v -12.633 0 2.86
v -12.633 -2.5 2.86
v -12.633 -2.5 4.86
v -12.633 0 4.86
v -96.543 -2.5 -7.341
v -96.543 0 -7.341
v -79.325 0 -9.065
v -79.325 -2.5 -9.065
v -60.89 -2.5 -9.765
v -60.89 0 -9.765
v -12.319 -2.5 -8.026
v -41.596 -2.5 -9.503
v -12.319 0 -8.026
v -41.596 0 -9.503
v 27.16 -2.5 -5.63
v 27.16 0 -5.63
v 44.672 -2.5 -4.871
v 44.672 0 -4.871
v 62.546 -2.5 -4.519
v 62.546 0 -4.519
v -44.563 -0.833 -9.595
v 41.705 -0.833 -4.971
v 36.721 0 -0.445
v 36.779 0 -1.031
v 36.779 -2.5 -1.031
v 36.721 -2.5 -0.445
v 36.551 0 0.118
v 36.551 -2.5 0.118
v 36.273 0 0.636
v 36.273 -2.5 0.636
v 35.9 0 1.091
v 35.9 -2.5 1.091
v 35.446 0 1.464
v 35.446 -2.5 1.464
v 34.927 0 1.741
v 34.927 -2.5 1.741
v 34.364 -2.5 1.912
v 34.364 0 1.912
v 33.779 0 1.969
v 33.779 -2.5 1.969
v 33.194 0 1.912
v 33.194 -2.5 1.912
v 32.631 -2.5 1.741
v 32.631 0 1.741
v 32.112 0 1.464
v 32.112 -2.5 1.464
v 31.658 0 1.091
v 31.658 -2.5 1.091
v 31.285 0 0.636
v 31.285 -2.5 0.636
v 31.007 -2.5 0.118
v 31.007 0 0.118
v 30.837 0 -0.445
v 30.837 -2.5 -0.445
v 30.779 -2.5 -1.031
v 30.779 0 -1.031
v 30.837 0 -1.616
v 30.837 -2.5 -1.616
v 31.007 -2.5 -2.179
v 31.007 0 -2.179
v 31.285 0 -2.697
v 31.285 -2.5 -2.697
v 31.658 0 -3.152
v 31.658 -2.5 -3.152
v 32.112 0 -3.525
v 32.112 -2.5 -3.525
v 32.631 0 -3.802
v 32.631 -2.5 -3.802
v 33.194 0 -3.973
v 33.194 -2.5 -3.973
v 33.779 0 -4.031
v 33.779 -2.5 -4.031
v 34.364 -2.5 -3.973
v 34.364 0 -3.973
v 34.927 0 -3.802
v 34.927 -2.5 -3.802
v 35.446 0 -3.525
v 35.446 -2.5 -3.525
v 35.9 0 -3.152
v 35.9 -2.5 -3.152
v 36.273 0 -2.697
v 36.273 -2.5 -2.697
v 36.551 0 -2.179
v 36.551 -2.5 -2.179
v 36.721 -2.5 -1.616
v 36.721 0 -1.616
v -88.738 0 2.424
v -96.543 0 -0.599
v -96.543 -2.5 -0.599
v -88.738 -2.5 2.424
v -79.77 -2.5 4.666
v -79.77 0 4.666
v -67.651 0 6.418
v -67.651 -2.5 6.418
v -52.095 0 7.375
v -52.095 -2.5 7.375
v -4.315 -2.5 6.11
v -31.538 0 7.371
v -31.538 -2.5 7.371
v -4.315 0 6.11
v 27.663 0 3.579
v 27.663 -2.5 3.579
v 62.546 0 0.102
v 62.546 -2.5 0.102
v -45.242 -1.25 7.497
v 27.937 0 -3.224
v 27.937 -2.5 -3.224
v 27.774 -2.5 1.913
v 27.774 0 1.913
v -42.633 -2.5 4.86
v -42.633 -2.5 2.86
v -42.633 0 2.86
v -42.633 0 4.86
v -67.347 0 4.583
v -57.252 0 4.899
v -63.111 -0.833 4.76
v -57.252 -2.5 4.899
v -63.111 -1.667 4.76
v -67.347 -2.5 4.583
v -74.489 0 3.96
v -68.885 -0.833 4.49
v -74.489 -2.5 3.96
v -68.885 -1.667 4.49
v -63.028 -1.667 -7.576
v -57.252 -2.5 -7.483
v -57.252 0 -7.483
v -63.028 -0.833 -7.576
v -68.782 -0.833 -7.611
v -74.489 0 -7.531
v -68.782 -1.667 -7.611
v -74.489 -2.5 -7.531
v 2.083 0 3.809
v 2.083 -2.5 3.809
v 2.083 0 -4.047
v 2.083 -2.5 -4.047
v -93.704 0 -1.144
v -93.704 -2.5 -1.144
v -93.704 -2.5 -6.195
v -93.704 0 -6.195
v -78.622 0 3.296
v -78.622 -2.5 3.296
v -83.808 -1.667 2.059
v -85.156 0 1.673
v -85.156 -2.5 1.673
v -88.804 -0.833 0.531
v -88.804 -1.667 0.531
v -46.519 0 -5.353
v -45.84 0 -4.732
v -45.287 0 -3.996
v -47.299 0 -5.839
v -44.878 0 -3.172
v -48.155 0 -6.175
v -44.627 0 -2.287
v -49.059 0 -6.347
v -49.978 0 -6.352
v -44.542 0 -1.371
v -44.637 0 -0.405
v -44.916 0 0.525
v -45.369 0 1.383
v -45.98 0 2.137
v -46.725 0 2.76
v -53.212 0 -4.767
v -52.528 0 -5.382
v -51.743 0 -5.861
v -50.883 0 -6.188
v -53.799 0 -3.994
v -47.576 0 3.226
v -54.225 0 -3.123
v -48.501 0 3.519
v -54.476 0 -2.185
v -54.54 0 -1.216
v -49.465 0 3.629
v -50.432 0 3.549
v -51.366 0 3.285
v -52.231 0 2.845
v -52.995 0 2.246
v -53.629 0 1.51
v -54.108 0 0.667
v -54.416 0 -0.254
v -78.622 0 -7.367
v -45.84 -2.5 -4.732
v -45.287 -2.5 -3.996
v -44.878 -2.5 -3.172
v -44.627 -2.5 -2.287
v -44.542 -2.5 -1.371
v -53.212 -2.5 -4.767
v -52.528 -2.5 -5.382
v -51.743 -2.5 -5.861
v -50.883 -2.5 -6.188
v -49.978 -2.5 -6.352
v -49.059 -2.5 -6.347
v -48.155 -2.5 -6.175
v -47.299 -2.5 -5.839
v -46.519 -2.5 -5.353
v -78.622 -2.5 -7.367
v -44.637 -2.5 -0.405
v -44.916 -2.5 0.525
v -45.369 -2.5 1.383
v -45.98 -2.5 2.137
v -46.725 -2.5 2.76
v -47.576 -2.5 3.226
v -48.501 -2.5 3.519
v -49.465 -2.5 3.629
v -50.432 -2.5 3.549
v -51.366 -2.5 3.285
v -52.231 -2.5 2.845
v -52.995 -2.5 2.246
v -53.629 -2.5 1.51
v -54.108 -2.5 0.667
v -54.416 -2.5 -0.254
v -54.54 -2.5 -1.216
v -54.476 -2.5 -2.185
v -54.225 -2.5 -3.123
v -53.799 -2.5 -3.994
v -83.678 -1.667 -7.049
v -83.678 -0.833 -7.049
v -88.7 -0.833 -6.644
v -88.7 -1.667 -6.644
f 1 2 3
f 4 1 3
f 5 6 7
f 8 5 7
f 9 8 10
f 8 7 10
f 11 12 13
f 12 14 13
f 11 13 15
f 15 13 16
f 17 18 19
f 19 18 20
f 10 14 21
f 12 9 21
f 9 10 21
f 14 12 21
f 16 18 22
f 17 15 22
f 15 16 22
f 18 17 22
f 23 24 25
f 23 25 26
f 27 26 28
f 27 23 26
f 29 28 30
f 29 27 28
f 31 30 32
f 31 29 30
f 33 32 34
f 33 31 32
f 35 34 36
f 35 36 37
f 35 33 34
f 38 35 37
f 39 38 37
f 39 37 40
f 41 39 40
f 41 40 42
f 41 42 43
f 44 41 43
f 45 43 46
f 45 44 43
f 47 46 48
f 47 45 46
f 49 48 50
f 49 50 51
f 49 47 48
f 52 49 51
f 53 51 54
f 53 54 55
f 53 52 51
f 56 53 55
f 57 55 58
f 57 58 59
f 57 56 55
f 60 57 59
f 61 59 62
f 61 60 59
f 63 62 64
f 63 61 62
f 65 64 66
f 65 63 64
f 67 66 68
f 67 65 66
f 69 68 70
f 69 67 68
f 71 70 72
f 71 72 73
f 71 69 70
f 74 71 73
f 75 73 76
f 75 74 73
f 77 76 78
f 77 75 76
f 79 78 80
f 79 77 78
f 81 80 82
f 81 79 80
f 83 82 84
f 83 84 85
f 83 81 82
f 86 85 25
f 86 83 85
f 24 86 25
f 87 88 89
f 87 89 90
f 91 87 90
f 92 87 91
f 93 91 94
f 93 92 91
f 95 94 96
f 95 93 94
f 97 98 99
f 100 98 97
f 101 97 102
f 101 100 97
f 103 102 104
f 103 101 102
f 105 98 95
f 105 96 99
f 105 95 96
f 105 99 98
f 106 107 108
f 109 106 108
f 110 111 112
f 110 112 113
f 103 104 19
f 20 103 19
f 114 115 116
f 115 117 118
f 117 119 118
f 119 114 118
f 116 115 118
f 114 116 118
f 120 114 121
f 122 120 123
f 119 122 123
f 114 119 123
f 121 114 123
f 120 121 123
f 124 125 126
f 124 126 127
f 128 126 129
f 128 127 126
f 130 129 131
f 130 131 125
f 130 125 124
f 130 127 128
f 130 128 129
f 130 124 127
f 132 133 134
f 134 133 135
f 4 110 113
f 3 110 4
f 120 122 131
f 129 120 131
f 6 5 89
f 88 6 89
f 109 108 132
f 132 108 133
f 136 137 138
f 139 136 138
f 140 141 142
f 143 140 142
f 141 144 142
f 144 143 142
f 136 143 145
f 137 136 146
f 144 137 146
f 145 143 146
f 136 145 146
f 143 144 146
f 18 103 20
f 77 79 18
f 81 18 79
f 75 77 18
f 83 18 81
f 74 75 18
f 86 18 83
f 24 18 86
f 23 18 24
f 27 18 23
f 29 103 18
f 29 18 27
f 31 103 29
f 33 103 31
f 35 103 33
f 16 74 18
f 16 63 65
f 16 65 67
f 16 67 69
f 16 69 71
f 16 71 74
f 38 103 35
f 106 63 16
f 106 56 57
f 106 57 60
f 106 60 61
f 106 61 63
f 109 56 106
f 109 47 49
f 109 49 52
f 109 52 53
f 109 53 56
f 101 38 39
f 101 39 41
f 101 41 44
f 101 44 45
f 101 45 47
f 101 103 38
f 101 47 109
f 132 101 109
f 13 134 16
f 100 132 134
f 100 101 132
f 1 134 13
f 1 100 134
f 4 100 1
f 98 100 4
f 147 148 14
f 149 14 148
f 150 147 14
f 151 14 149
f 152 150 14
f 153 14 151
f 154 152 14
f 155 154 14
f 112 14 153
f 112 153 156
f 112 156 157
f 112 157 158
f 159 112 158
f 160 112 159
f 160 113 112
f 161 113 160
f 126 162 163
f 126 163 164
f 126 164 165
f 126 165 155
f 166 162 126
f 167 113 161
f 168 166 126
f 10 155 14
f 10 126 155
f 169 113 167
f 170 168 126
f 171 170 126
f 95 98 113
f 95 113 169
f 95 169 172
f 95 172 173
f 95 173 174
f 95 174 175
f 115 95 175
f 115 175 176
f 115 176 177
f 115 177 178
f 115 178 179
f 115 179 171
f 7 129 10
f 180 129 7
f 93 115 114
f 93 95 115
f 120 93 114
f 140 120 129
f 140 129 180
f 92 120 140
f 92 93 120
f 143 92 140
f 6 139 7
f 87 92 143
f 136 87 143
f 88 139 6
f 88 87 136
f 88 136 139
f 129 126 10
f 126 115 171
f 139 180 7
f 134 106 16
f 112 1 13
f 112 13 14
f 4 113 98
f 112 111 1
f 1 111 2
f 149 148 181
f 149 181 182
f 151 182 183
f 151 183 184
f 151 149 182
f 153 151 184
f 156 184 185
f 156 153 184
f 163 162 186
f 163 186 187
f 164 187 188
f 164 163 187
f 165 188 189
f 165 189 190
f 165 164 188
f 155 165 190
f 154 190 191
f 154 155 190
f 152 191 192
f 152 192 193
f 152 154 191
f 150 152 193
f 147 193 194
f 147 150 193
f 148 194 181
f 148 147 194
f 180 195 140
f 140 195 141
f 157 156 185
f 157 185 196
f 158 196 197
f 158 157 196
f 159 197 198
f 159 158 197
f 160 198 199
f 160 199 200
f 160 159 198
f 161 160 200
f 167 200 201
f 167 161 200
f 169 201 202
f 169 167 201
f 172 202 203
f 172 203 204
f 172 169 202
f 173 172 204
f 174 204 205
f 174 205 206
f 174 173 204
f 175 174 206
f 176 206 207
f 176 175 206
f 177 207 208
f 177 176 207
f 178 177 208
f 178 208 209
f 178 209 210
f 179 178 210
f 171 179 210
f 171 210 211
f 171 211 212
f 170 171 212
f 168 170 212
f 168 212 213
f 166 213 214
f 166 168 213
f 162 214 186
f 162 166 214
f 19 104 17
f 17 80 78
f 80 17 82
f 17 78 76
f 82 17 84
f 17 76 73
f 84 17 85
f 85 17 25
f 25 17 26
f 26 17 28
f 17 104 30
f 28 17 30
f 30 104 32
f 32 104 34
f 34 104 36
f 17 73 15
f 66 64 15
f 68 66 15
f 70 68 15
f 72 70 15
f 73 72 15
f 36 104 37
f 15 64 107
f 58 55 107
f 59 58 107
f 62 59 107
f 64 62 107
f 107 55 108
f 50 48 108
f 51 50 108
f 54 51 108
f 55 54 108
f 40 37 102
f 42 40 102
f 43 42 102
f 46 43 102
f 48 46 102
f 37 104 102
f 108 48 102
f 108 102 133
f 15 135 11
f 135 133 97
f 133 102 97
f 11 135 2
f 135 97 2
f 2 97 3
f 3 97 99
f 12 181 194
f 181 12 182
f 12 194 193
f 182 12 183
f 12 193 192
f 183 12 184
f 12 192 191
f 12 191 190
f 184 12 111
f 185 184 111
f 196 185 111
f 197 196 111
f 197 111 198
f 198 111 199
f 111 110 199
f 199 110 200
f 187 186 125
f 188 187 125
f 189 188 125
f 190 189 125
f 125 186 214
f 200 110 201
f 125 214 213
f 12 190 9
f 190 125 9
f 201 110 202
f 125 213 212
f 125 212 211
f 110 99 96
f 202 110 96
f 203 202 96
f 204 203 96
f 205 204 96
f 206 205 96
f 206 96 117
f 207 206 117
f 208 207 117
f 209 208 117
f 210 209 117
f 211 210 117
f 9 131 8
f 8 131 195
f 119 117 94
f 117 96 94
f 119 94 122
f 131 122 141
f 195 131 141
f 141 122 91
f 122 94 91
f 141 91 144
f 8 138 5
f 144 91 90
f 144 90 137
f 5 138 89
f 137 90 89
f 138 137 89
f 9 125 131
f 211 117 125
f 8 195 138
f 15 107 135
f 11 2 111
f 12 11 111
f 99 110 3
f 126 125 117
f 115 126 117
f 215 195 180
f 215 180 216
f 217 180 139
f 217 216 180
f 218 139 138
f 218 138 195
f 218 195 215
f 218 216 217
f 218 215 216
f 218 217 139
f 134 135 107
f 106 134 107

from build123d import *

# Parameters (mm, degrees)
F2_DEPTH = 2.5
F1_R     = 3
F3_DEPTH = 2.5
F5_DEPTH = 2.5
F4_W     = 30
F4_H     = 2
F6_DEPTH = 2.5
F7_DEPTH = 2.5


with BuildPart() as f2:
    # F0 (on Front) → F2 (new body)
    with BuildSketch(Plane.XZ):
        with BuildLine():
            add(Edge.make_bspline(
                [(-96.9805282175, -0.8100506688), (-84.7869920978, 5.1468541776), (-38.6381415733, 10.9636146396), (42.6881882799, 2.4723259958), (100, -4.047003109)],
                knots=[0, 0, 0, 0, 0.374886421, 1, 1, 1, 1], degree=3))
            add(Edge.make_bspline(
                [(-97.5447368223, -7.1186651935), (-99.939251346, -6.5508492693), (-102.885147974, -5.168950634), (-100.0067471137, -2.3789404522), (-96.9805282175, -0.8100506688)],
                knots=[0.0564585679, 0.0564585679, 0.0564585679, 0.0564585679, 0.4847104148, 1, 1, 1, 1], degree=3))
            add(Edge.make_bspline(
                [(-96.5428845142, -7.3406707446), (-96.8949965543, -7.2673488468), (-97.22905608, -7.1935231869), (-97.5447368223, -7.1186651935)],
                knots=[0, 0, 0, 0, 0.0564585679, 0.0564585679, 0.0564585679, 0.0564585679], degree=3))
            add(Edge.make_bspline(
                [(-96.5428845142, -7.3406707446), (-80.7020161693, -9.4302402111), (-44.2471235075, -11.1181020976), (41.8622965332, -3.5518856086), (82.0915186506, -4.6802794425), (100, -4.047003109)],
                knots=[0, 0, 0, 0, 0.2987594418, 0.6837410955, 1, 1, 1, 1], degree=3))
        make_face()
        with BuildLine():
            add(Edge.make_bspline(
                [(-99.8196757147, -4.047003109), (-99.3821638101, -3.2227137691), (-97.9006497107, -2.3042858417), (-96.3385477662, -1.6362179573)],
                knots=[0.5425000514, 0.5425000514, 0.5425000514, 0.5425000514, 1, 1, 1, 1], degree=3))
            add(Edge.make_bspline(
                [(-96.3385477662, -1.6362179573), (-85.7442874691, 3.2900694446), (-38.7960585931, 10.0747672146), (36.943279708, 1.696590452), (86.094097513, -3.3751911245)],
                knots=[0, 0, 0, 0, 0.384923117, 1, 1, 1, 1], degree=3))
            add(Edge.make_bspline(
                [(-97.3825784566, -6.0471531808), (-82.3468325761, -8.841713568), (-44.2551066449, -8.6286827794), (40.9195716837, -3.3120714751), (72.7341022162, -3.1550192186), (86.094097513, -3.3751911245)],
                knots=[0, 0, 0, 0, 0.3131273629, 0.7122131732, 1, 1, 1, 1], degree=3))
            add(Edge.make_bspline(
                [(-97.3825784566, -6.0471531808), (-98.6588937786, -5.8946130057), (-100.1661659123, -5.1778479876), (-99.9138553768, -4.2244412327), (-99.8196757147, -4.047003109)],
                knots=[0, 0, 0, 0, 0.4440177242, 0.5425000514, 0.5425000514, 0.5425000514, 0.5425000514], degree=3))
        make_face(mode=Mode.SUBTRACT)
        with BuildLine():
            add(Edge.make_bspline(
                [(-96.3385477662, -1.6362179573), (-85.7442874691, 3.2900694446), (-38.7960585931, 10.0747672146), (36.943279708, 1.696590452), (86.094097513, -3.3751911245)],
                knots=[0, 0, 0, 0, 0.384923117, 1, 1, 1, 1], degree=3))
            add(Edge.make_bspline(
                [(-99.8196757147, -4.047003109), (-99.3821638101, -3.2227137691), (-97.9006497107, -2.3042858417), (-96.3385477662, -1.6362179573)],
                knots=[0.5425000514, 0.5425000514, 0.5425000514, 0.5425000514, 1, 1, 1, 1], degree=3))
            add(Edge.make_bspline(
                [(-97.3825784566, -6.0471531808), (-98.6588937786, -5.8946130057), (-100.1661659123, -5.1778479876), (-99.9138553768, -4.2244412327), (-99.8196757147, -4.047003109)],
                knots=[0, 0, 0, 0, 0.4440177242, 0.5425000514, 0.5425000514, 0.5425000514, 0.5425000514], degree=3))
            add(Edge.make_bspline(
                [(-97.3825784566, -6.0471531808), (-82.3468325761, -8.841713568), (-44.2551066449, -8.6286827794), (40.9195716837, -3.3120714751), (72.7341022162, -3.1550192186), (86.094097513, -3.3751911245)],
                knots=[0, 0, 0, 0, 0.3131273629, 0.7122131732, 1, 1, 1, 1], degree=3))
        make_face()
        with BuildLine():
            add(Edge.make_bspline(
                [(-96.5428845142, -7.3406707446), (-96.8949965543, -7.2673488468), (-97.22905608, -7.1935231869), (-97.5447368223, -7.1186651935)],
                knots=[0, 0, 0, 0, 0.0564585679, 0.0564585679, 0.0564585679, 0.0564585679], degree=3))
            ThreePointArc((-97.5447368223, -7.1186651935), (-97.052492706, -7.2688477084), (-96.5428845142, -7.3406707446))
        make_face()
    extrude(amount=F2_DEPTH)


with BuildPart() as f2b:
    # F1 (on Front) → F2, piece 2 (new body)
    with BuildSketch(Plane.XZ):
        with Locations((33.7789729238, -1.0305350879)):
            Circle(F1_R)
    extrude(amount=F2_DEPTH)


with BuildPart() as f2c:
    # F1 (on Front) → F2, piece 3 (new body)
    with BuildSketch(Plane.XZ):
        with BuildLine():
            ThreePointArc((-44.542362095, -1.3708024857), (-51.3662704709, 3.2846629299), (-53.2117053896, -4.7672594318))
            Line((-53.2117053896, -4.7672594318), (-45.8404576082, -4.7317403266))
            ThreePointArc((-45.8404576082, -4.7317403266), (-44.8781621403, -3.1722571154), (-44.542362095, -1.3708024857))
        make_face()
        with BuildLine():
            Line((-45.8404576082, -4.7317403266), (-53.2117053896, -4.7672594318))
            ThreePointArc((-53.2117053896, -4.7672594318), (-49.5182693675, -6.3707444394), (-45.8404576082, -4.7317403266))
        make_face()
    extrude(amount=F2_DEPTH)


with BuildPart() as f3_tool:
    # F1 (on Front) → F3 (new body)
    with BuildSketch(Plane.XZ):
        with BuildLine():
            ThreePointArc((-44.542362095, -1.3708024857), (-51.3662704709, 3.2846629299), (-53.2117053896, -4.7672594318))
            Line((-53.2117053896, -4.7672594318), (-45.8404576082, -4.7317403266))
            ThreePointArc((-45.8404576082, -4.7317403266), (-44.8781621403, -3.1722571154), (-44.542362095, -1.3708024857))
        make_face()
        with BuildLine():
            Line((-45.8404576082, -4.7317403266), (-53.2117053896, -4.7672594318))
            ThreePointArc((-53.2117053896, -4.7672594318), (-49.5182693675, -6.3707444394), (-45.8404576082, -4.7317403266))
        make_face()
        with Locations((33.7789729238, -1.0305350879)):
            Circle(F1_R)
    extrude(amount=F3_DEPTH)


with BuildPart() as f2_1:
    add(f2.part)

    # F3: cut by f3_tool
    add(f3_tool.part, mode=Mode.SUBTRACT)

    # F4 (on face) → F5 (cut)
    with BuildSketch(Plane.XZ.offset(2.5)):
        with BuildLine():
            Line((-96.5428845142, -7.3406707446), (-96.5428845142, -0.5989118026))
            add(Edge.make_bspline(
                [(-96.9805282175, -0.8100506688), (-96.8353706427, -0.7391368787), (-96.6894893165, -0.6687582494), (-96.5428845142, -0.5989118026)],
                knots=[0, 0, 0, 0, 0.0044628238, 0.0044628238, 0.0044628238, 0.0044628238], degree=3))
            add(Edge.make_bspline(
                [(-96.9805282175, -0.8100506688), (-100.0067471137, -2.3789404522), (-102.885147974, -5.168950634), (-99.939251346, -6.5508492693), (-97.5447368223, -7.1186651935)],
                knots=[0.0564585679, 0.0564585679, 0.0564585679, 0.0564585679, 0.5717481532, 1, 1, 1, 1], degree=3))
            ThreePointArc((-97.5447368223, -7.1186651935), (-97.052492706, -7.2688477084), (-96.5428845142, -7.3406707446))
        make_face()
    extrude(amount=-F5_DEPTH, mode=Mode.SUBTRACT)

    # F4 (on face) → F6 (cut)
    with BuildSketch(Plane.XZ.offset(2.5)):
        with BuildLine():
            Line((-78.6215588156, -7.3670944992), (-78.6215588156, 3.2958948603))
            add(Edge.make_bspline(
                [(-78.6215588156, 3.2958948603), (-83.9345486349, 2.2532028855), (-88.8194569144, 0.5548157735), (-93.7043651938, -1.1435713386)],
                knots=[0.554896308, 0.554896308, 0.554896308, 0.554896308, 1, 1, 1, 1], degree=3))
            Line((-93.7043651938, -1.1435713386), (-93.7043651938, -6.1954581179))
            add(Edge.make_bspline(
                [(-78.6215588156, -7.3670944992), (-83.7013643272, -7.1077100258), (-88.7028647605, -6.6515840718), (-93.7043651938, -6.1954581179)],
                knots=[0.5793594661, 0.5793594661, 0.5793594661, 0.5793594661, 1, 1, 1, 1], degree=3))
        make_face()
        with BuildLine():
            Line((-57.251535356, -7.4831936508), (-57.251535356, 4.8988820054))
            add(Edge.make_bspline(
                [(-57.251535356, 4.8988820054), (-63.1249518816, 4.7812850577), (-68.9983684072, 4.66368811), (-74.4892291338, 3.9601280834)],
                knots=[0, 0, 0, 0, 0.4418705618, 0.4418705618, 0.4418705618, 0.4418705618], degree=3))
            Line((-74.4892291338, 3.9601280834), (-74.4892291338, -7.5306241193))
            add(Edge.make_bspline(
                [(-57.251535356, -7.4831936508), (-63.0319736557, -7.5857864832), (-68.8124119553, -7.6883793156), (-74.4892291338, -7.5306241193)],
                knots=[0, 0, 0, 0, 0.4658094847, 0.4658094847, 0.4658094847, 0.4658094847], degree=3))
        make_face()
        with Locations((-27.6331795752, 3.8601249214)):
            Rectangle(F4_W, F4_H)
        Polygon((27.7735989974, 1.9125135442), (2.0833725575, 3.8092588075), (2.0833725575, -4.047003109), (27.937149629, -3.2237600535), align=None)
    extrude(amount=-F6_DEPTH, mode=Mode.SUBTRACT)

    # F4 (on face) → F7 (cut)
    with BuildSketch(Plane.XZ.offset(2.5)):
        with BuildLine():
            add(Edge.make_bspline(
                [(62.5460875734, 0.1020588345), (74.6514883615, -1.1873862537), (87.1633646635, -2.586811085), (100, -4.047003109)],
                knots=[0.8599877614, 0.8599877614, 0.8599877614, 0.8599877614, 1, 1, 1, 1], degree=3))
            Line((62.5460875734, 0.1020588345), (62.5460875734, -4.518638291))
            add(Edge.make_bspline(
                [(62.5460875734, -4.518638291), (75.9097127299, -4.3829595873), (88.0075171585, -4.4710790211), (100, -4.047003109)],
                knots=[0.7882160183, 0.7882160183, 0.7882160183, 0.7882160183, 1, 1, 1, 1], degree=3))
        make_face()
    extrude(amount=-F7_DEPTH, mode=Mode.SUBTRACT)


with BuildPart() as f2b_1:
    add(f2b.part)

    # F3: cut by f3_tool
    add(f3_tool.part, mode=Mode.SUBTRACT)


with BuildPart() as f2c_1:
    add(f2c.part)

    # F3: cut by f3_tool
    add(f3_tool.part, mode=Mode.SUBTRACT)


solid = f2_1.part
